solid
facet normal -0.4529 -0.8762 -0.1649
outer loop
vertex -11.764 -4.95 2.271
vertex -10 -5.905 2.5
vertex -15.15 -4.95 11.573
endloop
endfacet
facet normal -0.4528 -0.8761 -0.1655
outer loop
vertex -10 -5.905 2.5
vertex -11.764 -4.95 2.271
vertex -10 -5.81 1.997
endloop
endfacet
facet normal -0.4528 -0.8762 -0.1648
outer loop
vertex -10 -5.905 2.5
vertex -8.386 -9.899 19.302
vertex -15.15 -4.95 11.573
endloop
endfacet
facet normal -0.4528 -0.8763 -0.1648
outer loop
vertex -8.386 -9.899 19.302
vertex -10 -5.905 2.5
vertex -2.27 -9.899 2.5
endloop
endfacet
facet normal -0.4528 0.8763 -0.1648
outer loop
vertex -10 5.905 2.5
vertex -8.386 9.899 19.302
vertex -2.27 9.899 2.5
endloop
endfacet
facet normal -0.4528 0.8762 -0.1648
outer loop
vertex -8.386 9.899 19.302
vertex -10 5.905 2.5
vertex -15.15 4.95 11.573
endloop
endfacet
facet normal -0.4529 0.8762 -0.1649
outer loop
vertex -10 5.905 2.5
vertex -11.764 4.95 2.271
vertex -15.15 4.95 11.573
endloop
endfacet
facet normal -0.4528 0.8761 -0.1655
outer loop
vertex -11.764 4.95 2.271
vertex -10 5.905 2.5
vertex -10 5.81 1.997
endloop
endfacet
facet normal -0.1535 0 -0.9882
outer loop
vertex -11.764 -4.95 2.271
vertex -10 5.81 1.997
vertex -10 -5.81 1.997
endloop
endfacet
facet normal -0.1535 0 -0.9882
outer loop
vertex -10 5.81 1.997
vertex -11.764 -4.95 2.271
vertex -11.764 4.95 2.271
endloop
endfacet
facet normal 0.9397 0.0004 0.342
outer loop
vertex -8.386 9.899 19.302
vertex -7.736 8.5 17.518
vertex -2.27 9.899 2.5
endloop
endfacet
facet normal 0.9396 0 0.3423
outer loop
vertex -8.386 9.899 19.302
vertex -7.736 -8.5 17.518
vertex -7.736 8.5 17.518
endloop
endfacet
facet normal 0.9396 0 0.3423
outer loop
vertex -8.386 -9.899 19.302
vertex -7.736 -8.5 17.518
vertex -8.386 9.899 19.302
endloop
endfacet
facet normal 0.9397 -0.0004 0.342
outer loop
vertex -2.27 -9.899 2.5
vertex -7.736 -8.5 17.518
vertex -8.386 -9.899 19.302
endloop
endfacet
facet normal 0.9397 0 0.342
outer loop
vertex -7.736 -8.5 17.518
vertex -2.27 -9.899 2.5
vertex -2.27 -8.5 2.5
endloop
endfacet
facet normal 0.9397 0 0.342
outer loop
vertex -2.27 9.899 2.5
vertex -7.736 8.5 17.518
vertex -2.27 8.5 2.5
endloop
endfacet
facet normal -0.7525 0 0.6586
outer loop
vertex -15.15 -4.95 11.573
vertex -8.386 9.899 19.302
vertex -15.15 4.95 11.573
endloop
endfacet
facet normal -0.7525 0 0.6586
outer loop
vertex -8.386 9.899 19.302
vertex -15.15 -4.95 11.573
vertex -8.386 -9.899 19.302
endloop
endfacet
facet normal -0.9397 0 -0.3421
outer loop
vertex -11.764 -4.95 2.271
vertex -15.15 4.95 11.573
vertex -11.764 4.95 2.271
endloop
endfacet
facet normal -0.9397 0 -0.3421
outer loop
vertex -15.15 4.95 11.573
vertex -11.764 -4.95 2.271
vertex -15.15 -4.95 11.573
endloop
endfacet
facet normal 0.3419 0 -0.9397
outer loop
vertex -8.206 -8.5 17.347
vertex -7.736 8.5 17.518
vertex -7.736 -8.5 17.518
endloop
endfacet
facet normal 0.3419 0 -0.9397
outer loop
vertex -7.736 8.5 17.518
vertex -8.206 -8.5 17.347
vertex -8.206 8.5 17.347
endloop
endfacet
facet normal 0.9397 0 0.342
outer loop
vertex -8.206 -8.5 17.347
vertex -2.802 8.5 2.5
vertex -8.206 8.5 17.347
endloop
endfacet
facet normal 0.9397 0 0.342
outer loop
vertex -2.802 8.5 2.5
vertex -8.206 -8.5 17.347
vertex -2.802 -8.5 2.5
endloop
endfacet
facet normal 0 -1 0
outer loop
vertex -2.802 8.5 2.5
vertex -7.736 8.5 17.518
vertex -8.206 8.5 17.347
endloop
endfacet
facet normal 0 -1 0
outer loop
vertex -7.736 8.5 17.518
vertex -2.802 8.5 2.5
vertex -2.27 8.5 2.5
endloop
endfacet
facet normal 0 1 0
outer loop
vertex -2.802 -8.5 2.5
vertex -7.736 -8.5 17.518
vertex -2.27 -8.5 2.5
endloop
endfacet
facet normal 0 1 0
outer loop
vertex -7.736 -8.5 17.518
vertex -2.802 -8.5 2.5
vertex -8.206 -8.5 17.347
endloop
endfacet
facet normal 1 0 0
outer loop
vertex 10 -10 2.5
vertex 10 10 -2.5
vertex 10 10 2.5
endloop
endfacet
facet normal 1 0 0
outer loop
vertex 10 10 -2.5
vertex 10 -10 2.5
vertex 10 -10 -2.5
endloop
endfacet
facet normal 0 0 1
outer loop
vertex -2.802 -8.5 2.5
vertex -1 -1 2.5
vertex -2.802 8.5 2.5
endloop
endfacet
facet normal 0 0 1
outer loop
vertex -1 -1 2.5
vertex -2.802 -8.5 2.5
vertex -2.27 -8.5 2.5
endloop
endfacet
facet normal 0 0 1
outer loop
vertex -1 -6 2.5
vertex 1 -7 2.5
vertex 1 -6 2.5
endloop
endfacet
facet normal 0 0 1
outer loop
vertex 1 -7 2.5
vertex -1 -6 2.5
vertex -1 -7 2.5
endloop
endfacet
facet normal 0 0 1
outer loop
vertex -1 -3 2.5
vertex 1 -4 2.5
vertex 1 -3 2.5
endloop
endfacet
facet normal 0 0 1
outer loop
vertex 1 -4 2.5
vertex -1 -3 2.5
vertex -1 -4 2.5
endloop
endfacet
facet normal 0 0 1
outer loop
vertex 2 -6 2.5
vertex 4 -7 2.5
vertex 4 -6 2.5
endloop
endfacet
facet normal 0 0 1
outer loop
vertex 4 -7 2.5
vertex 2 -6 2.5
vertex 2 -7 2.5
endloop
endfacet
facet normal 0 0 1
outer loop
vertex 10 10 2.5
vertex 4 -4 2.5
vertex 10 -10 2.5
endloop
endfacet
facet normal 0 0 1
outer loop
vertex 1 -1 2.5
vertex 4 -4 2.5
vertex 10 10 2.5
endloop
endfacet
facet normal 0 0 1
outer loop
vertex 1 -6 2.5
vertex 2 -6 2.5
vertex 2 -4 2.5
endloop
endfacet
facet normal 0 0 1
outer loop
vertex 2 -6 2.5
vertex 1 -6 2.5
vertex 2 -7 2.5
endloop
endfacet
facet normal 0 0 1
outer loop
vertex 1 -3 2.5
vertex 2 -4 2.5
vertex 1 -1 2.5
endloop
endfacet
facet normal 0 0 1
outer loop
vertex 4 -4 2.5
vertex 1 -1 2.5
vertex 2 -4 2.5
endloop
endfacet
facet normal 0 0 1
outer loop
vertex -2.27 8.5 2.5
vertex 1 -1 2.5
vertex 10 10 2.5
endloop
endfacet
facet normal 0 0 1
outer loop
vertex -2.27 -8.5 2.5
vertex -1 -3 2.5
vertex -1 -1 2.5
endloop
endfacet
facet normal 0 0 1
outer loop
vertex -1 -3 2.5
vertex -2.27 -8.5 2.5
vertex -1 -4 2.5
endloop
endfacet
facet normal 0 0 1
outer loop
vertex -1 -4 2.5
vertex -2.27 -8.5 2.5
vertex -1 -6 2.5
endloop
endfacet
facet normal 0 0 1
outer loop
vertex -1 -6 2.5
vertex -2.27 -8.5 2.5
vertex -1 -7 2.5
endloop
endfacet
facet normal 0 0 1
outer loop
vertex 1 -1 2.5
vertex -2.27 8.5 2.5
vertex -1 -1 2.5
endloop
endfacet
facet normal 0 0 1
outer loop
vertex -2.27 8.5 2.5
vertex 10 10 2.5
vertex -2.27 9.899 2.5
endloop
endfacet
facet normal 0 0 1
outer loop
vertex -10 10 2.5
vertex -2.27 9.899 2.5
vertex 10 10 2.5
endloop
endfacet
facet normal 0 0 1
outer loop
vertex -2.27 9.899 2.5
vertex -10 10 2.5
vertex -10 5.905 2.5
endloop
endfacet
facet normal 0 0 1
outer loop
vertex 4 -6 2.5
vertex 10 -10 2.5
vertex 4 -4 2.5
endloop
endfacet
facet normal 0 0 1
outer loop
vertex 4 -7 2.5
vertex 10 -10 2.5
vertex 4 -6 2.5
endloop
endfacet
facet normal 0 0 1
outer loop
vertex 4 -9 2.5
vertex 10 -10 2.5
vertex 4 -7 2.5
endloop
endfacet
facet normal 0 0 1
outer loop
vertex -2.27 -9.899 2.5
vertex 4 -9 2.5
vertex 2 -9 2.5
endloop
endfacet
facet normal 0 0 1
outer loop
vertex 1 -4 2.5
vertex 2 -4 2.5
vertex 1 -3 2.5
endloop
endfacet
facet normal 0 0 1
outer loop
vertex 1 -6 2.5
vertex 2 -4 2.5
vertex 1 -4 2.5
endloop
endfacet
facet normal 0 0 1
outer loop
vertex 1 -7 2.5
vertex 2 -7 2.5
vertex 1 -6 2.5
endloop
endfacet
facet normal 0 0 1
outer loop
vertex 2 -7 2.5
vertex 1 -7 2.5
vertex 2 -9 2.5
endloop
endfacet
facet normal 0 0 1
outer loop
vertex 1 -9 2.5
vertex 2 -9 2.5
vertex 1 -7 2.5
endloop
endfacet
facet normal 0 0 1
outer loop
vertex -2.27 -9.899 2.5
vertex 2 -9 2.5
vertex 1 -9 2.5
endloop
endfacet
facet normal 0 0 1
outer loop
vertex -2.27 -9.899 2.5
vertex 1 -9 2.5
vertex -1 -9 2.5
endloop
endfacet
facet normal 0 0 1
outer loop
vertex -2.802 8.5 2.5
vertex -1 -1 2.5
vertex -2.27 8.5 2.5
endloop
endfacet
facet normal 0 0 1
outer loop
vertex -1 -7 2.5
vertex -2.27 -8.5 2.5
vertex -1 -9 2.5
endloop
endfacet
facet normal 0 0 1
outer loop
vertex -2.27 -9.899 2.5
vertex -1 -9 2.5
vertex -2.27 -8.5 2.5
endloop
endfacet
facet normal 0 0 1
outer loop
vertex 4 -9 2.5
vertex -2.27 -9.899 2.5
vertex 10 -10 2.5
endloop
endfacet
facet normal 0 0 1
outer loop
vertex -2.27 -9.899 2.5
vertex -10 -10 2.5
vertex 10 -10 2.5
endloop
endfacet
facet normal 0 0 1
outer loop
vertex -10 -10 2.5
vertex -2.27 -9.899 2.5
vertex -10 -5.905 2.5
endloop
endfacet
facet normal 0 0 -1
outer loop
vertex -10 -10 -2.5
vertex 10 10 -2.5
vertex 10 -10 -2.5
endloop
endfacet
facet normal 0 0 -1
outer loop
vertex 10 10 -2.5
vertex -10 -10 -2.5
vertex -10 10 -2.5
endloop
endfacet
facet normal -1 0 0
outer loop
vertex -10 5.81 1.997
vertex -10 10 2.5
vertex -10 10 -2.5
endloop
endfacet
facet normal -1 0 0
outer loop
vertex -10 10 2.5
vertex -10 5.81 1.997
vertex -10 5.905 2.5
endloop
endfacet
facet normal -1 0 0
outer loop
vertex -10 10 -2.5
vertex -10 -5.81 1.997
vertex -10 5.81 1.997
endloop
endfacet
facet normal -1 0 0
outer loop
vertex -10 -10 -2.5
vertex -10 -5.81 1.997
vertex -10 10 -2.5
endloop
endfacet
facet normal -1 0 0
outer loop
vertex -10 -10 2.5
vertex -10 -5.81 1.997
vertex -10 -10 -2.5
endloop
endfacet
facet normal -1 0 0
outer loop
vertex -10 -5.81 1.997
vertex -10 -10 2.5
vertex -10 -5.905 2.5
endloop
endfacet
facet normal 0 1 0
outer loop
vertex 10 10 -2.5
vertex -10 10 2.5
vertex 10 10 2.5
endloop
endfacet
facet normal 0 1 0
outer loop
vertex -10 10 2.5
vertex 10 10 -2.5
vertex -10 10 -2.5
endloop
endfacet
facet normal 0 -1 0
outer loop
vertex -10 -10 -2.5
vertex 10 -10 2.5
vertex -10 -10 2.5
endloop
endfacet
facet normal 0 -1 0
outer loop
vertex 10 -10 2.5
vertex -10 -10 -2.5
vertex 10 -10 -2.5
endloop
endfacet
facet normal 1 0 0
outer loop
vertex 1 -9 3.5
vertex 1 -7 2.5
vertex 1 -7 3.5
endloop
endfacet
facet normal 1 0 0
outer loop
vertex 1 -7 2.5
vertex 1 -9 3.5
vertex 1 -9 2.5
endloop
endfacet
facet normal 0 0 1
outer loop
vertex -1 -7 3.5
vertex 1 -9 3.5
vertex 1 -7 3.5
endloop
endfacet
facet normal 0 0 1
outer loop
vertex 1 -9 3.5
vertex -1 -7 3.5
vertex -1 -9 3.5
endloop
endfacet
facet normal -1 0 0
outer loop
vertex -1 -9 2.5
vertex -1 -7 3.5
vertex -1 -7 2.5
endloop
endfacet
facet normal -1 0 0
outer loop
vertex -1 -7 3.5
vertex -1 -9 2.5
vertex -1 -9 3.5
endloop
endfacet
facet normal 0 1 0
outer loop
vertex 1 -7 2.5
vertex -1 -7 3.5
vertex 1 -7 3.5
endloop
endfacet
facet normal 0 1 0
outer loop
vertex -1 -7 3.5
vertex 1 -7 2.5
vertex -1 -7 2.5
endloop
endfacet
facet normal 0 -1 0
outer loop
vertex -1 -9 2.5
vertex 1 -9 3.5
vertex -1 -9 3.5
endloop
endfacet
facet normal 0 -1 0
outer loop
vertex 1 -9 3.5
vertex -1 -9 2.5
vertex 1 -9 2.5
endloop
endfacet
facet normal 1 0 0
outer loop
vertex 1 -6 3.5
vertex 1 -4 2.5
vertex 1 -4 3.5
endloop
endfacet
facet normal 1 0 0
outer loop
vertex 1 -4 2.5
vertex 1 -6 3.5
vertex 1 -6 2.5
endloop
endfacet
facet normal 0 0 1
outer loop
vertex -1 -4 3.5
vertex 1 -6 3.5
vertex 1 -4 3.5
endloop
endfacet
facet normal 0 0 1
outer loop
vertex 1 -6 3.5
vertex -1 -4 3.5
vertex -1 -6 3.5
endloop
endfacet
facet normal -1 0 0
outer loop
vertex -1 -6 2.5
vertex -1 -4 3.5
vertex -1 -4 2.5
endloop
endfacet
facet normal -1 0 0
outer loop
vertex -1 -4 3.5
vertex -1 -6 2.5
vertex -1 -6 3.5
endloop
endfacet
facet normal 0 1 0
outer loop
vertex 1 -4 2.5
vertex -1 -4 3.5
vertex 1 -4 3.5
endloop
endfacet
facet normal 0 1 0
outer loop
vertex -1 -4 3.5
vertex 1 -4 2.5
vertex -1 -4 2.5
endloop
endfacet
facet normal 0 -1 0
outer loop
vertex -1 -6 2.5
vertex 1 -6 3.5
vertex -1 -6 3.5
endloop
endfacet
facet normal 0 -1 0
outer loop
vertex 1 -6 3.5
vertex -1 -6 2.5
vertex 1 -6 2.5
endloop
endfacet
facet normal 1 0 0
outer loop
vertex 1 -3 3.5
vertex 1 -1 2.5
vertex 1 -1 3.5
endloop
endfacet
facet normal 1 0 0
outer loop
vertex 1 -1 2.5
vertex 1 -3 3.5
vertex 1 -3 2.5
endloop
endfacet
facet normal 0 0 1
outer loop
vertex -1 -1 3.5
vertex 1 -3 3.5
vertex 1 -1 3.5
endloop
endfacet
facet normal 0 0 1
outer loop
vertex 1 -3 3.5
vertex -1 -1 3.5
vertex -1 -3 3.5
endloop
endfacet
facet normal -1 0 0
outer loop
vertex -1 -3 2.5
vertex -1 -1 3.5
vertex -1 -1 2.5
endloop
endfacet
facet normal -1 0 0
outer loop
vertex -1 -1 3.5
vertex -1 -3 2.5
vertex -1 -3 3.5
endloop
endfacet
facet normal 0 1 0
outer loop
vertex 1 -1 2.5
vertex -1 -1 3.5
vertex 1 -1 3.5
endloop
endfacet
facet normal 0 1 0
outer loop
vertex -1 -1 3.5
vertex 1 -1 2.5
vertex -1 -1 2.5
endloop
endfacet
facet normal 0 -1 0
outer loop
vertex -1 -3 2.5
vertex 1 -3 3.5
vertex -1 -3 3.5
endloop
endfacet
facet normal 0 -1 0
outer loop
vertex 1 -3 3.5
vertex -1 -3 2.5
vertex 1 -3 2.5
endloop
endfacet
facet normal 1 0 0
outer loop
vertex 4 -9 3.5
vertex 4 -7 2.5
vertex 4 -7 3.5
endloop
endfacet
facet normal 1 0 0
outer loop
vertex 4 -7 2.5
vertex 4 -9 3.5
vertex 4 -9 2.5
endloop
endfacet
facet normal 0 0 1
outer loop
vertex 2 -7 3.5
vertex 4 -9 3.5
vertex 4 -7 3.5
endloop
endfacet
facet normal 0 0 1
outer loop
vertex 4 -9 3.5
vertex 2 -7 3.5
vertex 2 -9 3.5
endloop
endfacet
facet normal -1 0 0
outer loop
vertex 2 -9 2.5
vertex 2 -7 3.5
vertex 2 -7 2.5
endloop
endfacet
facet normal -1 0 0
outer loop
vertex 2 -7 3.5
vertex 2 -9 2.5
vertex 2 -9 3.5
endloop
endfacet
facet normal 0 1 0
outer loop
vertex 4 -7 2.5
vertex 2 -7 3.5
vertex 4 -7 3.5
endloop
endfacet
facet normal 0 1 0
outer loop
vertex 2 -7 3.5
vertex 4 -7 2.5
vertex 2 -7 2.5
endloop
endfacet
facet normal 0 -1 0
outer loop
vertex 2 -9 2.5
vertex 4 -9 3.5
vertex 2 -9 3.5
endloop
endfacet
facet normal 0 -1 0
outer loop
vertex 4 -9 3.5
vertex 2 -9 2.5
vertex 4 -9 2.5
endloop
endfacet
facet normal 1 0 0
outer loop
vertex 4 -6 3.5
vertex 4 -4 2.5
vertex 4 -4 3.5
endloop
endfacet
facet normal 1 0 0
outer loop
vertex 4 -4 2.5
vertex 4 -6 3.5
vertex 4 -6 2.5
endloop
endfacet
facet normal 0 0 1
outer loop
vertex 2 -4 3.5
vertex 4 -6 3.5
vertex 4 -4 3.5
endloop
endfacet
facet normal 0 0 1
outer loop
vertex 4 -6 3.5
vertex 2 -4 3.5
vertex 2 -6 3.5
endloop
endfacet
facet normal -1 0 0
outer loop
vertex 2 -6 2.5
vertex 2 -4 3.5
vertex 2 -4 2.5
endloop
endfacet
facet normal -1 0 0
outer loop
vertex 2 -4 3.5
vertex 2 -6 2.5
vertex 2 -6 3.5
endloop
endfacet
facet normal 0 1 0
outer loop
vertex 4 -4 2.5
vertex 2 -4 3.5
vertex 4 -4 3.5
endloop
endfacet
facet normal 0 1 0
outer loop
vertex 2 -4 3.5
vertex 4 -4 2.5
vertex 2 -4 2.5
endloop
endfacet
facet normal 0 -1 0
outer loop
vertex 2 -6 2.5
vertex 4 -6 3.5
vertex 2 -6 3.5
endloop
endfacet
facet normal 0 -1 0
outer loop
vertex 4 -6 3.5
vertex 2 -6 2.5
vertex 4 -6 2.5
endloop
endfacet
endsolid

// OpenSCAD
// abstract computer terminal
// ward cunningham, 12/26,2017

// keyboard
cube([20,20,5],true);
module button (x,y) { translate([x,y,2.5]){ cube(2,true); } }
button(0,-8); button(0,-5); button(0,-2);
button(3,-8); button(3,-5);

// monitor
translate([-5,0,10])rotate([0,-110,0]) {
    difference() {
        // cabinet
        rotate([0,0,45]) { cylinder(9,14,7,$fn=4); }
        // screen
        translate([0,0,-2]) cube([16,17,5],true);
}
}
